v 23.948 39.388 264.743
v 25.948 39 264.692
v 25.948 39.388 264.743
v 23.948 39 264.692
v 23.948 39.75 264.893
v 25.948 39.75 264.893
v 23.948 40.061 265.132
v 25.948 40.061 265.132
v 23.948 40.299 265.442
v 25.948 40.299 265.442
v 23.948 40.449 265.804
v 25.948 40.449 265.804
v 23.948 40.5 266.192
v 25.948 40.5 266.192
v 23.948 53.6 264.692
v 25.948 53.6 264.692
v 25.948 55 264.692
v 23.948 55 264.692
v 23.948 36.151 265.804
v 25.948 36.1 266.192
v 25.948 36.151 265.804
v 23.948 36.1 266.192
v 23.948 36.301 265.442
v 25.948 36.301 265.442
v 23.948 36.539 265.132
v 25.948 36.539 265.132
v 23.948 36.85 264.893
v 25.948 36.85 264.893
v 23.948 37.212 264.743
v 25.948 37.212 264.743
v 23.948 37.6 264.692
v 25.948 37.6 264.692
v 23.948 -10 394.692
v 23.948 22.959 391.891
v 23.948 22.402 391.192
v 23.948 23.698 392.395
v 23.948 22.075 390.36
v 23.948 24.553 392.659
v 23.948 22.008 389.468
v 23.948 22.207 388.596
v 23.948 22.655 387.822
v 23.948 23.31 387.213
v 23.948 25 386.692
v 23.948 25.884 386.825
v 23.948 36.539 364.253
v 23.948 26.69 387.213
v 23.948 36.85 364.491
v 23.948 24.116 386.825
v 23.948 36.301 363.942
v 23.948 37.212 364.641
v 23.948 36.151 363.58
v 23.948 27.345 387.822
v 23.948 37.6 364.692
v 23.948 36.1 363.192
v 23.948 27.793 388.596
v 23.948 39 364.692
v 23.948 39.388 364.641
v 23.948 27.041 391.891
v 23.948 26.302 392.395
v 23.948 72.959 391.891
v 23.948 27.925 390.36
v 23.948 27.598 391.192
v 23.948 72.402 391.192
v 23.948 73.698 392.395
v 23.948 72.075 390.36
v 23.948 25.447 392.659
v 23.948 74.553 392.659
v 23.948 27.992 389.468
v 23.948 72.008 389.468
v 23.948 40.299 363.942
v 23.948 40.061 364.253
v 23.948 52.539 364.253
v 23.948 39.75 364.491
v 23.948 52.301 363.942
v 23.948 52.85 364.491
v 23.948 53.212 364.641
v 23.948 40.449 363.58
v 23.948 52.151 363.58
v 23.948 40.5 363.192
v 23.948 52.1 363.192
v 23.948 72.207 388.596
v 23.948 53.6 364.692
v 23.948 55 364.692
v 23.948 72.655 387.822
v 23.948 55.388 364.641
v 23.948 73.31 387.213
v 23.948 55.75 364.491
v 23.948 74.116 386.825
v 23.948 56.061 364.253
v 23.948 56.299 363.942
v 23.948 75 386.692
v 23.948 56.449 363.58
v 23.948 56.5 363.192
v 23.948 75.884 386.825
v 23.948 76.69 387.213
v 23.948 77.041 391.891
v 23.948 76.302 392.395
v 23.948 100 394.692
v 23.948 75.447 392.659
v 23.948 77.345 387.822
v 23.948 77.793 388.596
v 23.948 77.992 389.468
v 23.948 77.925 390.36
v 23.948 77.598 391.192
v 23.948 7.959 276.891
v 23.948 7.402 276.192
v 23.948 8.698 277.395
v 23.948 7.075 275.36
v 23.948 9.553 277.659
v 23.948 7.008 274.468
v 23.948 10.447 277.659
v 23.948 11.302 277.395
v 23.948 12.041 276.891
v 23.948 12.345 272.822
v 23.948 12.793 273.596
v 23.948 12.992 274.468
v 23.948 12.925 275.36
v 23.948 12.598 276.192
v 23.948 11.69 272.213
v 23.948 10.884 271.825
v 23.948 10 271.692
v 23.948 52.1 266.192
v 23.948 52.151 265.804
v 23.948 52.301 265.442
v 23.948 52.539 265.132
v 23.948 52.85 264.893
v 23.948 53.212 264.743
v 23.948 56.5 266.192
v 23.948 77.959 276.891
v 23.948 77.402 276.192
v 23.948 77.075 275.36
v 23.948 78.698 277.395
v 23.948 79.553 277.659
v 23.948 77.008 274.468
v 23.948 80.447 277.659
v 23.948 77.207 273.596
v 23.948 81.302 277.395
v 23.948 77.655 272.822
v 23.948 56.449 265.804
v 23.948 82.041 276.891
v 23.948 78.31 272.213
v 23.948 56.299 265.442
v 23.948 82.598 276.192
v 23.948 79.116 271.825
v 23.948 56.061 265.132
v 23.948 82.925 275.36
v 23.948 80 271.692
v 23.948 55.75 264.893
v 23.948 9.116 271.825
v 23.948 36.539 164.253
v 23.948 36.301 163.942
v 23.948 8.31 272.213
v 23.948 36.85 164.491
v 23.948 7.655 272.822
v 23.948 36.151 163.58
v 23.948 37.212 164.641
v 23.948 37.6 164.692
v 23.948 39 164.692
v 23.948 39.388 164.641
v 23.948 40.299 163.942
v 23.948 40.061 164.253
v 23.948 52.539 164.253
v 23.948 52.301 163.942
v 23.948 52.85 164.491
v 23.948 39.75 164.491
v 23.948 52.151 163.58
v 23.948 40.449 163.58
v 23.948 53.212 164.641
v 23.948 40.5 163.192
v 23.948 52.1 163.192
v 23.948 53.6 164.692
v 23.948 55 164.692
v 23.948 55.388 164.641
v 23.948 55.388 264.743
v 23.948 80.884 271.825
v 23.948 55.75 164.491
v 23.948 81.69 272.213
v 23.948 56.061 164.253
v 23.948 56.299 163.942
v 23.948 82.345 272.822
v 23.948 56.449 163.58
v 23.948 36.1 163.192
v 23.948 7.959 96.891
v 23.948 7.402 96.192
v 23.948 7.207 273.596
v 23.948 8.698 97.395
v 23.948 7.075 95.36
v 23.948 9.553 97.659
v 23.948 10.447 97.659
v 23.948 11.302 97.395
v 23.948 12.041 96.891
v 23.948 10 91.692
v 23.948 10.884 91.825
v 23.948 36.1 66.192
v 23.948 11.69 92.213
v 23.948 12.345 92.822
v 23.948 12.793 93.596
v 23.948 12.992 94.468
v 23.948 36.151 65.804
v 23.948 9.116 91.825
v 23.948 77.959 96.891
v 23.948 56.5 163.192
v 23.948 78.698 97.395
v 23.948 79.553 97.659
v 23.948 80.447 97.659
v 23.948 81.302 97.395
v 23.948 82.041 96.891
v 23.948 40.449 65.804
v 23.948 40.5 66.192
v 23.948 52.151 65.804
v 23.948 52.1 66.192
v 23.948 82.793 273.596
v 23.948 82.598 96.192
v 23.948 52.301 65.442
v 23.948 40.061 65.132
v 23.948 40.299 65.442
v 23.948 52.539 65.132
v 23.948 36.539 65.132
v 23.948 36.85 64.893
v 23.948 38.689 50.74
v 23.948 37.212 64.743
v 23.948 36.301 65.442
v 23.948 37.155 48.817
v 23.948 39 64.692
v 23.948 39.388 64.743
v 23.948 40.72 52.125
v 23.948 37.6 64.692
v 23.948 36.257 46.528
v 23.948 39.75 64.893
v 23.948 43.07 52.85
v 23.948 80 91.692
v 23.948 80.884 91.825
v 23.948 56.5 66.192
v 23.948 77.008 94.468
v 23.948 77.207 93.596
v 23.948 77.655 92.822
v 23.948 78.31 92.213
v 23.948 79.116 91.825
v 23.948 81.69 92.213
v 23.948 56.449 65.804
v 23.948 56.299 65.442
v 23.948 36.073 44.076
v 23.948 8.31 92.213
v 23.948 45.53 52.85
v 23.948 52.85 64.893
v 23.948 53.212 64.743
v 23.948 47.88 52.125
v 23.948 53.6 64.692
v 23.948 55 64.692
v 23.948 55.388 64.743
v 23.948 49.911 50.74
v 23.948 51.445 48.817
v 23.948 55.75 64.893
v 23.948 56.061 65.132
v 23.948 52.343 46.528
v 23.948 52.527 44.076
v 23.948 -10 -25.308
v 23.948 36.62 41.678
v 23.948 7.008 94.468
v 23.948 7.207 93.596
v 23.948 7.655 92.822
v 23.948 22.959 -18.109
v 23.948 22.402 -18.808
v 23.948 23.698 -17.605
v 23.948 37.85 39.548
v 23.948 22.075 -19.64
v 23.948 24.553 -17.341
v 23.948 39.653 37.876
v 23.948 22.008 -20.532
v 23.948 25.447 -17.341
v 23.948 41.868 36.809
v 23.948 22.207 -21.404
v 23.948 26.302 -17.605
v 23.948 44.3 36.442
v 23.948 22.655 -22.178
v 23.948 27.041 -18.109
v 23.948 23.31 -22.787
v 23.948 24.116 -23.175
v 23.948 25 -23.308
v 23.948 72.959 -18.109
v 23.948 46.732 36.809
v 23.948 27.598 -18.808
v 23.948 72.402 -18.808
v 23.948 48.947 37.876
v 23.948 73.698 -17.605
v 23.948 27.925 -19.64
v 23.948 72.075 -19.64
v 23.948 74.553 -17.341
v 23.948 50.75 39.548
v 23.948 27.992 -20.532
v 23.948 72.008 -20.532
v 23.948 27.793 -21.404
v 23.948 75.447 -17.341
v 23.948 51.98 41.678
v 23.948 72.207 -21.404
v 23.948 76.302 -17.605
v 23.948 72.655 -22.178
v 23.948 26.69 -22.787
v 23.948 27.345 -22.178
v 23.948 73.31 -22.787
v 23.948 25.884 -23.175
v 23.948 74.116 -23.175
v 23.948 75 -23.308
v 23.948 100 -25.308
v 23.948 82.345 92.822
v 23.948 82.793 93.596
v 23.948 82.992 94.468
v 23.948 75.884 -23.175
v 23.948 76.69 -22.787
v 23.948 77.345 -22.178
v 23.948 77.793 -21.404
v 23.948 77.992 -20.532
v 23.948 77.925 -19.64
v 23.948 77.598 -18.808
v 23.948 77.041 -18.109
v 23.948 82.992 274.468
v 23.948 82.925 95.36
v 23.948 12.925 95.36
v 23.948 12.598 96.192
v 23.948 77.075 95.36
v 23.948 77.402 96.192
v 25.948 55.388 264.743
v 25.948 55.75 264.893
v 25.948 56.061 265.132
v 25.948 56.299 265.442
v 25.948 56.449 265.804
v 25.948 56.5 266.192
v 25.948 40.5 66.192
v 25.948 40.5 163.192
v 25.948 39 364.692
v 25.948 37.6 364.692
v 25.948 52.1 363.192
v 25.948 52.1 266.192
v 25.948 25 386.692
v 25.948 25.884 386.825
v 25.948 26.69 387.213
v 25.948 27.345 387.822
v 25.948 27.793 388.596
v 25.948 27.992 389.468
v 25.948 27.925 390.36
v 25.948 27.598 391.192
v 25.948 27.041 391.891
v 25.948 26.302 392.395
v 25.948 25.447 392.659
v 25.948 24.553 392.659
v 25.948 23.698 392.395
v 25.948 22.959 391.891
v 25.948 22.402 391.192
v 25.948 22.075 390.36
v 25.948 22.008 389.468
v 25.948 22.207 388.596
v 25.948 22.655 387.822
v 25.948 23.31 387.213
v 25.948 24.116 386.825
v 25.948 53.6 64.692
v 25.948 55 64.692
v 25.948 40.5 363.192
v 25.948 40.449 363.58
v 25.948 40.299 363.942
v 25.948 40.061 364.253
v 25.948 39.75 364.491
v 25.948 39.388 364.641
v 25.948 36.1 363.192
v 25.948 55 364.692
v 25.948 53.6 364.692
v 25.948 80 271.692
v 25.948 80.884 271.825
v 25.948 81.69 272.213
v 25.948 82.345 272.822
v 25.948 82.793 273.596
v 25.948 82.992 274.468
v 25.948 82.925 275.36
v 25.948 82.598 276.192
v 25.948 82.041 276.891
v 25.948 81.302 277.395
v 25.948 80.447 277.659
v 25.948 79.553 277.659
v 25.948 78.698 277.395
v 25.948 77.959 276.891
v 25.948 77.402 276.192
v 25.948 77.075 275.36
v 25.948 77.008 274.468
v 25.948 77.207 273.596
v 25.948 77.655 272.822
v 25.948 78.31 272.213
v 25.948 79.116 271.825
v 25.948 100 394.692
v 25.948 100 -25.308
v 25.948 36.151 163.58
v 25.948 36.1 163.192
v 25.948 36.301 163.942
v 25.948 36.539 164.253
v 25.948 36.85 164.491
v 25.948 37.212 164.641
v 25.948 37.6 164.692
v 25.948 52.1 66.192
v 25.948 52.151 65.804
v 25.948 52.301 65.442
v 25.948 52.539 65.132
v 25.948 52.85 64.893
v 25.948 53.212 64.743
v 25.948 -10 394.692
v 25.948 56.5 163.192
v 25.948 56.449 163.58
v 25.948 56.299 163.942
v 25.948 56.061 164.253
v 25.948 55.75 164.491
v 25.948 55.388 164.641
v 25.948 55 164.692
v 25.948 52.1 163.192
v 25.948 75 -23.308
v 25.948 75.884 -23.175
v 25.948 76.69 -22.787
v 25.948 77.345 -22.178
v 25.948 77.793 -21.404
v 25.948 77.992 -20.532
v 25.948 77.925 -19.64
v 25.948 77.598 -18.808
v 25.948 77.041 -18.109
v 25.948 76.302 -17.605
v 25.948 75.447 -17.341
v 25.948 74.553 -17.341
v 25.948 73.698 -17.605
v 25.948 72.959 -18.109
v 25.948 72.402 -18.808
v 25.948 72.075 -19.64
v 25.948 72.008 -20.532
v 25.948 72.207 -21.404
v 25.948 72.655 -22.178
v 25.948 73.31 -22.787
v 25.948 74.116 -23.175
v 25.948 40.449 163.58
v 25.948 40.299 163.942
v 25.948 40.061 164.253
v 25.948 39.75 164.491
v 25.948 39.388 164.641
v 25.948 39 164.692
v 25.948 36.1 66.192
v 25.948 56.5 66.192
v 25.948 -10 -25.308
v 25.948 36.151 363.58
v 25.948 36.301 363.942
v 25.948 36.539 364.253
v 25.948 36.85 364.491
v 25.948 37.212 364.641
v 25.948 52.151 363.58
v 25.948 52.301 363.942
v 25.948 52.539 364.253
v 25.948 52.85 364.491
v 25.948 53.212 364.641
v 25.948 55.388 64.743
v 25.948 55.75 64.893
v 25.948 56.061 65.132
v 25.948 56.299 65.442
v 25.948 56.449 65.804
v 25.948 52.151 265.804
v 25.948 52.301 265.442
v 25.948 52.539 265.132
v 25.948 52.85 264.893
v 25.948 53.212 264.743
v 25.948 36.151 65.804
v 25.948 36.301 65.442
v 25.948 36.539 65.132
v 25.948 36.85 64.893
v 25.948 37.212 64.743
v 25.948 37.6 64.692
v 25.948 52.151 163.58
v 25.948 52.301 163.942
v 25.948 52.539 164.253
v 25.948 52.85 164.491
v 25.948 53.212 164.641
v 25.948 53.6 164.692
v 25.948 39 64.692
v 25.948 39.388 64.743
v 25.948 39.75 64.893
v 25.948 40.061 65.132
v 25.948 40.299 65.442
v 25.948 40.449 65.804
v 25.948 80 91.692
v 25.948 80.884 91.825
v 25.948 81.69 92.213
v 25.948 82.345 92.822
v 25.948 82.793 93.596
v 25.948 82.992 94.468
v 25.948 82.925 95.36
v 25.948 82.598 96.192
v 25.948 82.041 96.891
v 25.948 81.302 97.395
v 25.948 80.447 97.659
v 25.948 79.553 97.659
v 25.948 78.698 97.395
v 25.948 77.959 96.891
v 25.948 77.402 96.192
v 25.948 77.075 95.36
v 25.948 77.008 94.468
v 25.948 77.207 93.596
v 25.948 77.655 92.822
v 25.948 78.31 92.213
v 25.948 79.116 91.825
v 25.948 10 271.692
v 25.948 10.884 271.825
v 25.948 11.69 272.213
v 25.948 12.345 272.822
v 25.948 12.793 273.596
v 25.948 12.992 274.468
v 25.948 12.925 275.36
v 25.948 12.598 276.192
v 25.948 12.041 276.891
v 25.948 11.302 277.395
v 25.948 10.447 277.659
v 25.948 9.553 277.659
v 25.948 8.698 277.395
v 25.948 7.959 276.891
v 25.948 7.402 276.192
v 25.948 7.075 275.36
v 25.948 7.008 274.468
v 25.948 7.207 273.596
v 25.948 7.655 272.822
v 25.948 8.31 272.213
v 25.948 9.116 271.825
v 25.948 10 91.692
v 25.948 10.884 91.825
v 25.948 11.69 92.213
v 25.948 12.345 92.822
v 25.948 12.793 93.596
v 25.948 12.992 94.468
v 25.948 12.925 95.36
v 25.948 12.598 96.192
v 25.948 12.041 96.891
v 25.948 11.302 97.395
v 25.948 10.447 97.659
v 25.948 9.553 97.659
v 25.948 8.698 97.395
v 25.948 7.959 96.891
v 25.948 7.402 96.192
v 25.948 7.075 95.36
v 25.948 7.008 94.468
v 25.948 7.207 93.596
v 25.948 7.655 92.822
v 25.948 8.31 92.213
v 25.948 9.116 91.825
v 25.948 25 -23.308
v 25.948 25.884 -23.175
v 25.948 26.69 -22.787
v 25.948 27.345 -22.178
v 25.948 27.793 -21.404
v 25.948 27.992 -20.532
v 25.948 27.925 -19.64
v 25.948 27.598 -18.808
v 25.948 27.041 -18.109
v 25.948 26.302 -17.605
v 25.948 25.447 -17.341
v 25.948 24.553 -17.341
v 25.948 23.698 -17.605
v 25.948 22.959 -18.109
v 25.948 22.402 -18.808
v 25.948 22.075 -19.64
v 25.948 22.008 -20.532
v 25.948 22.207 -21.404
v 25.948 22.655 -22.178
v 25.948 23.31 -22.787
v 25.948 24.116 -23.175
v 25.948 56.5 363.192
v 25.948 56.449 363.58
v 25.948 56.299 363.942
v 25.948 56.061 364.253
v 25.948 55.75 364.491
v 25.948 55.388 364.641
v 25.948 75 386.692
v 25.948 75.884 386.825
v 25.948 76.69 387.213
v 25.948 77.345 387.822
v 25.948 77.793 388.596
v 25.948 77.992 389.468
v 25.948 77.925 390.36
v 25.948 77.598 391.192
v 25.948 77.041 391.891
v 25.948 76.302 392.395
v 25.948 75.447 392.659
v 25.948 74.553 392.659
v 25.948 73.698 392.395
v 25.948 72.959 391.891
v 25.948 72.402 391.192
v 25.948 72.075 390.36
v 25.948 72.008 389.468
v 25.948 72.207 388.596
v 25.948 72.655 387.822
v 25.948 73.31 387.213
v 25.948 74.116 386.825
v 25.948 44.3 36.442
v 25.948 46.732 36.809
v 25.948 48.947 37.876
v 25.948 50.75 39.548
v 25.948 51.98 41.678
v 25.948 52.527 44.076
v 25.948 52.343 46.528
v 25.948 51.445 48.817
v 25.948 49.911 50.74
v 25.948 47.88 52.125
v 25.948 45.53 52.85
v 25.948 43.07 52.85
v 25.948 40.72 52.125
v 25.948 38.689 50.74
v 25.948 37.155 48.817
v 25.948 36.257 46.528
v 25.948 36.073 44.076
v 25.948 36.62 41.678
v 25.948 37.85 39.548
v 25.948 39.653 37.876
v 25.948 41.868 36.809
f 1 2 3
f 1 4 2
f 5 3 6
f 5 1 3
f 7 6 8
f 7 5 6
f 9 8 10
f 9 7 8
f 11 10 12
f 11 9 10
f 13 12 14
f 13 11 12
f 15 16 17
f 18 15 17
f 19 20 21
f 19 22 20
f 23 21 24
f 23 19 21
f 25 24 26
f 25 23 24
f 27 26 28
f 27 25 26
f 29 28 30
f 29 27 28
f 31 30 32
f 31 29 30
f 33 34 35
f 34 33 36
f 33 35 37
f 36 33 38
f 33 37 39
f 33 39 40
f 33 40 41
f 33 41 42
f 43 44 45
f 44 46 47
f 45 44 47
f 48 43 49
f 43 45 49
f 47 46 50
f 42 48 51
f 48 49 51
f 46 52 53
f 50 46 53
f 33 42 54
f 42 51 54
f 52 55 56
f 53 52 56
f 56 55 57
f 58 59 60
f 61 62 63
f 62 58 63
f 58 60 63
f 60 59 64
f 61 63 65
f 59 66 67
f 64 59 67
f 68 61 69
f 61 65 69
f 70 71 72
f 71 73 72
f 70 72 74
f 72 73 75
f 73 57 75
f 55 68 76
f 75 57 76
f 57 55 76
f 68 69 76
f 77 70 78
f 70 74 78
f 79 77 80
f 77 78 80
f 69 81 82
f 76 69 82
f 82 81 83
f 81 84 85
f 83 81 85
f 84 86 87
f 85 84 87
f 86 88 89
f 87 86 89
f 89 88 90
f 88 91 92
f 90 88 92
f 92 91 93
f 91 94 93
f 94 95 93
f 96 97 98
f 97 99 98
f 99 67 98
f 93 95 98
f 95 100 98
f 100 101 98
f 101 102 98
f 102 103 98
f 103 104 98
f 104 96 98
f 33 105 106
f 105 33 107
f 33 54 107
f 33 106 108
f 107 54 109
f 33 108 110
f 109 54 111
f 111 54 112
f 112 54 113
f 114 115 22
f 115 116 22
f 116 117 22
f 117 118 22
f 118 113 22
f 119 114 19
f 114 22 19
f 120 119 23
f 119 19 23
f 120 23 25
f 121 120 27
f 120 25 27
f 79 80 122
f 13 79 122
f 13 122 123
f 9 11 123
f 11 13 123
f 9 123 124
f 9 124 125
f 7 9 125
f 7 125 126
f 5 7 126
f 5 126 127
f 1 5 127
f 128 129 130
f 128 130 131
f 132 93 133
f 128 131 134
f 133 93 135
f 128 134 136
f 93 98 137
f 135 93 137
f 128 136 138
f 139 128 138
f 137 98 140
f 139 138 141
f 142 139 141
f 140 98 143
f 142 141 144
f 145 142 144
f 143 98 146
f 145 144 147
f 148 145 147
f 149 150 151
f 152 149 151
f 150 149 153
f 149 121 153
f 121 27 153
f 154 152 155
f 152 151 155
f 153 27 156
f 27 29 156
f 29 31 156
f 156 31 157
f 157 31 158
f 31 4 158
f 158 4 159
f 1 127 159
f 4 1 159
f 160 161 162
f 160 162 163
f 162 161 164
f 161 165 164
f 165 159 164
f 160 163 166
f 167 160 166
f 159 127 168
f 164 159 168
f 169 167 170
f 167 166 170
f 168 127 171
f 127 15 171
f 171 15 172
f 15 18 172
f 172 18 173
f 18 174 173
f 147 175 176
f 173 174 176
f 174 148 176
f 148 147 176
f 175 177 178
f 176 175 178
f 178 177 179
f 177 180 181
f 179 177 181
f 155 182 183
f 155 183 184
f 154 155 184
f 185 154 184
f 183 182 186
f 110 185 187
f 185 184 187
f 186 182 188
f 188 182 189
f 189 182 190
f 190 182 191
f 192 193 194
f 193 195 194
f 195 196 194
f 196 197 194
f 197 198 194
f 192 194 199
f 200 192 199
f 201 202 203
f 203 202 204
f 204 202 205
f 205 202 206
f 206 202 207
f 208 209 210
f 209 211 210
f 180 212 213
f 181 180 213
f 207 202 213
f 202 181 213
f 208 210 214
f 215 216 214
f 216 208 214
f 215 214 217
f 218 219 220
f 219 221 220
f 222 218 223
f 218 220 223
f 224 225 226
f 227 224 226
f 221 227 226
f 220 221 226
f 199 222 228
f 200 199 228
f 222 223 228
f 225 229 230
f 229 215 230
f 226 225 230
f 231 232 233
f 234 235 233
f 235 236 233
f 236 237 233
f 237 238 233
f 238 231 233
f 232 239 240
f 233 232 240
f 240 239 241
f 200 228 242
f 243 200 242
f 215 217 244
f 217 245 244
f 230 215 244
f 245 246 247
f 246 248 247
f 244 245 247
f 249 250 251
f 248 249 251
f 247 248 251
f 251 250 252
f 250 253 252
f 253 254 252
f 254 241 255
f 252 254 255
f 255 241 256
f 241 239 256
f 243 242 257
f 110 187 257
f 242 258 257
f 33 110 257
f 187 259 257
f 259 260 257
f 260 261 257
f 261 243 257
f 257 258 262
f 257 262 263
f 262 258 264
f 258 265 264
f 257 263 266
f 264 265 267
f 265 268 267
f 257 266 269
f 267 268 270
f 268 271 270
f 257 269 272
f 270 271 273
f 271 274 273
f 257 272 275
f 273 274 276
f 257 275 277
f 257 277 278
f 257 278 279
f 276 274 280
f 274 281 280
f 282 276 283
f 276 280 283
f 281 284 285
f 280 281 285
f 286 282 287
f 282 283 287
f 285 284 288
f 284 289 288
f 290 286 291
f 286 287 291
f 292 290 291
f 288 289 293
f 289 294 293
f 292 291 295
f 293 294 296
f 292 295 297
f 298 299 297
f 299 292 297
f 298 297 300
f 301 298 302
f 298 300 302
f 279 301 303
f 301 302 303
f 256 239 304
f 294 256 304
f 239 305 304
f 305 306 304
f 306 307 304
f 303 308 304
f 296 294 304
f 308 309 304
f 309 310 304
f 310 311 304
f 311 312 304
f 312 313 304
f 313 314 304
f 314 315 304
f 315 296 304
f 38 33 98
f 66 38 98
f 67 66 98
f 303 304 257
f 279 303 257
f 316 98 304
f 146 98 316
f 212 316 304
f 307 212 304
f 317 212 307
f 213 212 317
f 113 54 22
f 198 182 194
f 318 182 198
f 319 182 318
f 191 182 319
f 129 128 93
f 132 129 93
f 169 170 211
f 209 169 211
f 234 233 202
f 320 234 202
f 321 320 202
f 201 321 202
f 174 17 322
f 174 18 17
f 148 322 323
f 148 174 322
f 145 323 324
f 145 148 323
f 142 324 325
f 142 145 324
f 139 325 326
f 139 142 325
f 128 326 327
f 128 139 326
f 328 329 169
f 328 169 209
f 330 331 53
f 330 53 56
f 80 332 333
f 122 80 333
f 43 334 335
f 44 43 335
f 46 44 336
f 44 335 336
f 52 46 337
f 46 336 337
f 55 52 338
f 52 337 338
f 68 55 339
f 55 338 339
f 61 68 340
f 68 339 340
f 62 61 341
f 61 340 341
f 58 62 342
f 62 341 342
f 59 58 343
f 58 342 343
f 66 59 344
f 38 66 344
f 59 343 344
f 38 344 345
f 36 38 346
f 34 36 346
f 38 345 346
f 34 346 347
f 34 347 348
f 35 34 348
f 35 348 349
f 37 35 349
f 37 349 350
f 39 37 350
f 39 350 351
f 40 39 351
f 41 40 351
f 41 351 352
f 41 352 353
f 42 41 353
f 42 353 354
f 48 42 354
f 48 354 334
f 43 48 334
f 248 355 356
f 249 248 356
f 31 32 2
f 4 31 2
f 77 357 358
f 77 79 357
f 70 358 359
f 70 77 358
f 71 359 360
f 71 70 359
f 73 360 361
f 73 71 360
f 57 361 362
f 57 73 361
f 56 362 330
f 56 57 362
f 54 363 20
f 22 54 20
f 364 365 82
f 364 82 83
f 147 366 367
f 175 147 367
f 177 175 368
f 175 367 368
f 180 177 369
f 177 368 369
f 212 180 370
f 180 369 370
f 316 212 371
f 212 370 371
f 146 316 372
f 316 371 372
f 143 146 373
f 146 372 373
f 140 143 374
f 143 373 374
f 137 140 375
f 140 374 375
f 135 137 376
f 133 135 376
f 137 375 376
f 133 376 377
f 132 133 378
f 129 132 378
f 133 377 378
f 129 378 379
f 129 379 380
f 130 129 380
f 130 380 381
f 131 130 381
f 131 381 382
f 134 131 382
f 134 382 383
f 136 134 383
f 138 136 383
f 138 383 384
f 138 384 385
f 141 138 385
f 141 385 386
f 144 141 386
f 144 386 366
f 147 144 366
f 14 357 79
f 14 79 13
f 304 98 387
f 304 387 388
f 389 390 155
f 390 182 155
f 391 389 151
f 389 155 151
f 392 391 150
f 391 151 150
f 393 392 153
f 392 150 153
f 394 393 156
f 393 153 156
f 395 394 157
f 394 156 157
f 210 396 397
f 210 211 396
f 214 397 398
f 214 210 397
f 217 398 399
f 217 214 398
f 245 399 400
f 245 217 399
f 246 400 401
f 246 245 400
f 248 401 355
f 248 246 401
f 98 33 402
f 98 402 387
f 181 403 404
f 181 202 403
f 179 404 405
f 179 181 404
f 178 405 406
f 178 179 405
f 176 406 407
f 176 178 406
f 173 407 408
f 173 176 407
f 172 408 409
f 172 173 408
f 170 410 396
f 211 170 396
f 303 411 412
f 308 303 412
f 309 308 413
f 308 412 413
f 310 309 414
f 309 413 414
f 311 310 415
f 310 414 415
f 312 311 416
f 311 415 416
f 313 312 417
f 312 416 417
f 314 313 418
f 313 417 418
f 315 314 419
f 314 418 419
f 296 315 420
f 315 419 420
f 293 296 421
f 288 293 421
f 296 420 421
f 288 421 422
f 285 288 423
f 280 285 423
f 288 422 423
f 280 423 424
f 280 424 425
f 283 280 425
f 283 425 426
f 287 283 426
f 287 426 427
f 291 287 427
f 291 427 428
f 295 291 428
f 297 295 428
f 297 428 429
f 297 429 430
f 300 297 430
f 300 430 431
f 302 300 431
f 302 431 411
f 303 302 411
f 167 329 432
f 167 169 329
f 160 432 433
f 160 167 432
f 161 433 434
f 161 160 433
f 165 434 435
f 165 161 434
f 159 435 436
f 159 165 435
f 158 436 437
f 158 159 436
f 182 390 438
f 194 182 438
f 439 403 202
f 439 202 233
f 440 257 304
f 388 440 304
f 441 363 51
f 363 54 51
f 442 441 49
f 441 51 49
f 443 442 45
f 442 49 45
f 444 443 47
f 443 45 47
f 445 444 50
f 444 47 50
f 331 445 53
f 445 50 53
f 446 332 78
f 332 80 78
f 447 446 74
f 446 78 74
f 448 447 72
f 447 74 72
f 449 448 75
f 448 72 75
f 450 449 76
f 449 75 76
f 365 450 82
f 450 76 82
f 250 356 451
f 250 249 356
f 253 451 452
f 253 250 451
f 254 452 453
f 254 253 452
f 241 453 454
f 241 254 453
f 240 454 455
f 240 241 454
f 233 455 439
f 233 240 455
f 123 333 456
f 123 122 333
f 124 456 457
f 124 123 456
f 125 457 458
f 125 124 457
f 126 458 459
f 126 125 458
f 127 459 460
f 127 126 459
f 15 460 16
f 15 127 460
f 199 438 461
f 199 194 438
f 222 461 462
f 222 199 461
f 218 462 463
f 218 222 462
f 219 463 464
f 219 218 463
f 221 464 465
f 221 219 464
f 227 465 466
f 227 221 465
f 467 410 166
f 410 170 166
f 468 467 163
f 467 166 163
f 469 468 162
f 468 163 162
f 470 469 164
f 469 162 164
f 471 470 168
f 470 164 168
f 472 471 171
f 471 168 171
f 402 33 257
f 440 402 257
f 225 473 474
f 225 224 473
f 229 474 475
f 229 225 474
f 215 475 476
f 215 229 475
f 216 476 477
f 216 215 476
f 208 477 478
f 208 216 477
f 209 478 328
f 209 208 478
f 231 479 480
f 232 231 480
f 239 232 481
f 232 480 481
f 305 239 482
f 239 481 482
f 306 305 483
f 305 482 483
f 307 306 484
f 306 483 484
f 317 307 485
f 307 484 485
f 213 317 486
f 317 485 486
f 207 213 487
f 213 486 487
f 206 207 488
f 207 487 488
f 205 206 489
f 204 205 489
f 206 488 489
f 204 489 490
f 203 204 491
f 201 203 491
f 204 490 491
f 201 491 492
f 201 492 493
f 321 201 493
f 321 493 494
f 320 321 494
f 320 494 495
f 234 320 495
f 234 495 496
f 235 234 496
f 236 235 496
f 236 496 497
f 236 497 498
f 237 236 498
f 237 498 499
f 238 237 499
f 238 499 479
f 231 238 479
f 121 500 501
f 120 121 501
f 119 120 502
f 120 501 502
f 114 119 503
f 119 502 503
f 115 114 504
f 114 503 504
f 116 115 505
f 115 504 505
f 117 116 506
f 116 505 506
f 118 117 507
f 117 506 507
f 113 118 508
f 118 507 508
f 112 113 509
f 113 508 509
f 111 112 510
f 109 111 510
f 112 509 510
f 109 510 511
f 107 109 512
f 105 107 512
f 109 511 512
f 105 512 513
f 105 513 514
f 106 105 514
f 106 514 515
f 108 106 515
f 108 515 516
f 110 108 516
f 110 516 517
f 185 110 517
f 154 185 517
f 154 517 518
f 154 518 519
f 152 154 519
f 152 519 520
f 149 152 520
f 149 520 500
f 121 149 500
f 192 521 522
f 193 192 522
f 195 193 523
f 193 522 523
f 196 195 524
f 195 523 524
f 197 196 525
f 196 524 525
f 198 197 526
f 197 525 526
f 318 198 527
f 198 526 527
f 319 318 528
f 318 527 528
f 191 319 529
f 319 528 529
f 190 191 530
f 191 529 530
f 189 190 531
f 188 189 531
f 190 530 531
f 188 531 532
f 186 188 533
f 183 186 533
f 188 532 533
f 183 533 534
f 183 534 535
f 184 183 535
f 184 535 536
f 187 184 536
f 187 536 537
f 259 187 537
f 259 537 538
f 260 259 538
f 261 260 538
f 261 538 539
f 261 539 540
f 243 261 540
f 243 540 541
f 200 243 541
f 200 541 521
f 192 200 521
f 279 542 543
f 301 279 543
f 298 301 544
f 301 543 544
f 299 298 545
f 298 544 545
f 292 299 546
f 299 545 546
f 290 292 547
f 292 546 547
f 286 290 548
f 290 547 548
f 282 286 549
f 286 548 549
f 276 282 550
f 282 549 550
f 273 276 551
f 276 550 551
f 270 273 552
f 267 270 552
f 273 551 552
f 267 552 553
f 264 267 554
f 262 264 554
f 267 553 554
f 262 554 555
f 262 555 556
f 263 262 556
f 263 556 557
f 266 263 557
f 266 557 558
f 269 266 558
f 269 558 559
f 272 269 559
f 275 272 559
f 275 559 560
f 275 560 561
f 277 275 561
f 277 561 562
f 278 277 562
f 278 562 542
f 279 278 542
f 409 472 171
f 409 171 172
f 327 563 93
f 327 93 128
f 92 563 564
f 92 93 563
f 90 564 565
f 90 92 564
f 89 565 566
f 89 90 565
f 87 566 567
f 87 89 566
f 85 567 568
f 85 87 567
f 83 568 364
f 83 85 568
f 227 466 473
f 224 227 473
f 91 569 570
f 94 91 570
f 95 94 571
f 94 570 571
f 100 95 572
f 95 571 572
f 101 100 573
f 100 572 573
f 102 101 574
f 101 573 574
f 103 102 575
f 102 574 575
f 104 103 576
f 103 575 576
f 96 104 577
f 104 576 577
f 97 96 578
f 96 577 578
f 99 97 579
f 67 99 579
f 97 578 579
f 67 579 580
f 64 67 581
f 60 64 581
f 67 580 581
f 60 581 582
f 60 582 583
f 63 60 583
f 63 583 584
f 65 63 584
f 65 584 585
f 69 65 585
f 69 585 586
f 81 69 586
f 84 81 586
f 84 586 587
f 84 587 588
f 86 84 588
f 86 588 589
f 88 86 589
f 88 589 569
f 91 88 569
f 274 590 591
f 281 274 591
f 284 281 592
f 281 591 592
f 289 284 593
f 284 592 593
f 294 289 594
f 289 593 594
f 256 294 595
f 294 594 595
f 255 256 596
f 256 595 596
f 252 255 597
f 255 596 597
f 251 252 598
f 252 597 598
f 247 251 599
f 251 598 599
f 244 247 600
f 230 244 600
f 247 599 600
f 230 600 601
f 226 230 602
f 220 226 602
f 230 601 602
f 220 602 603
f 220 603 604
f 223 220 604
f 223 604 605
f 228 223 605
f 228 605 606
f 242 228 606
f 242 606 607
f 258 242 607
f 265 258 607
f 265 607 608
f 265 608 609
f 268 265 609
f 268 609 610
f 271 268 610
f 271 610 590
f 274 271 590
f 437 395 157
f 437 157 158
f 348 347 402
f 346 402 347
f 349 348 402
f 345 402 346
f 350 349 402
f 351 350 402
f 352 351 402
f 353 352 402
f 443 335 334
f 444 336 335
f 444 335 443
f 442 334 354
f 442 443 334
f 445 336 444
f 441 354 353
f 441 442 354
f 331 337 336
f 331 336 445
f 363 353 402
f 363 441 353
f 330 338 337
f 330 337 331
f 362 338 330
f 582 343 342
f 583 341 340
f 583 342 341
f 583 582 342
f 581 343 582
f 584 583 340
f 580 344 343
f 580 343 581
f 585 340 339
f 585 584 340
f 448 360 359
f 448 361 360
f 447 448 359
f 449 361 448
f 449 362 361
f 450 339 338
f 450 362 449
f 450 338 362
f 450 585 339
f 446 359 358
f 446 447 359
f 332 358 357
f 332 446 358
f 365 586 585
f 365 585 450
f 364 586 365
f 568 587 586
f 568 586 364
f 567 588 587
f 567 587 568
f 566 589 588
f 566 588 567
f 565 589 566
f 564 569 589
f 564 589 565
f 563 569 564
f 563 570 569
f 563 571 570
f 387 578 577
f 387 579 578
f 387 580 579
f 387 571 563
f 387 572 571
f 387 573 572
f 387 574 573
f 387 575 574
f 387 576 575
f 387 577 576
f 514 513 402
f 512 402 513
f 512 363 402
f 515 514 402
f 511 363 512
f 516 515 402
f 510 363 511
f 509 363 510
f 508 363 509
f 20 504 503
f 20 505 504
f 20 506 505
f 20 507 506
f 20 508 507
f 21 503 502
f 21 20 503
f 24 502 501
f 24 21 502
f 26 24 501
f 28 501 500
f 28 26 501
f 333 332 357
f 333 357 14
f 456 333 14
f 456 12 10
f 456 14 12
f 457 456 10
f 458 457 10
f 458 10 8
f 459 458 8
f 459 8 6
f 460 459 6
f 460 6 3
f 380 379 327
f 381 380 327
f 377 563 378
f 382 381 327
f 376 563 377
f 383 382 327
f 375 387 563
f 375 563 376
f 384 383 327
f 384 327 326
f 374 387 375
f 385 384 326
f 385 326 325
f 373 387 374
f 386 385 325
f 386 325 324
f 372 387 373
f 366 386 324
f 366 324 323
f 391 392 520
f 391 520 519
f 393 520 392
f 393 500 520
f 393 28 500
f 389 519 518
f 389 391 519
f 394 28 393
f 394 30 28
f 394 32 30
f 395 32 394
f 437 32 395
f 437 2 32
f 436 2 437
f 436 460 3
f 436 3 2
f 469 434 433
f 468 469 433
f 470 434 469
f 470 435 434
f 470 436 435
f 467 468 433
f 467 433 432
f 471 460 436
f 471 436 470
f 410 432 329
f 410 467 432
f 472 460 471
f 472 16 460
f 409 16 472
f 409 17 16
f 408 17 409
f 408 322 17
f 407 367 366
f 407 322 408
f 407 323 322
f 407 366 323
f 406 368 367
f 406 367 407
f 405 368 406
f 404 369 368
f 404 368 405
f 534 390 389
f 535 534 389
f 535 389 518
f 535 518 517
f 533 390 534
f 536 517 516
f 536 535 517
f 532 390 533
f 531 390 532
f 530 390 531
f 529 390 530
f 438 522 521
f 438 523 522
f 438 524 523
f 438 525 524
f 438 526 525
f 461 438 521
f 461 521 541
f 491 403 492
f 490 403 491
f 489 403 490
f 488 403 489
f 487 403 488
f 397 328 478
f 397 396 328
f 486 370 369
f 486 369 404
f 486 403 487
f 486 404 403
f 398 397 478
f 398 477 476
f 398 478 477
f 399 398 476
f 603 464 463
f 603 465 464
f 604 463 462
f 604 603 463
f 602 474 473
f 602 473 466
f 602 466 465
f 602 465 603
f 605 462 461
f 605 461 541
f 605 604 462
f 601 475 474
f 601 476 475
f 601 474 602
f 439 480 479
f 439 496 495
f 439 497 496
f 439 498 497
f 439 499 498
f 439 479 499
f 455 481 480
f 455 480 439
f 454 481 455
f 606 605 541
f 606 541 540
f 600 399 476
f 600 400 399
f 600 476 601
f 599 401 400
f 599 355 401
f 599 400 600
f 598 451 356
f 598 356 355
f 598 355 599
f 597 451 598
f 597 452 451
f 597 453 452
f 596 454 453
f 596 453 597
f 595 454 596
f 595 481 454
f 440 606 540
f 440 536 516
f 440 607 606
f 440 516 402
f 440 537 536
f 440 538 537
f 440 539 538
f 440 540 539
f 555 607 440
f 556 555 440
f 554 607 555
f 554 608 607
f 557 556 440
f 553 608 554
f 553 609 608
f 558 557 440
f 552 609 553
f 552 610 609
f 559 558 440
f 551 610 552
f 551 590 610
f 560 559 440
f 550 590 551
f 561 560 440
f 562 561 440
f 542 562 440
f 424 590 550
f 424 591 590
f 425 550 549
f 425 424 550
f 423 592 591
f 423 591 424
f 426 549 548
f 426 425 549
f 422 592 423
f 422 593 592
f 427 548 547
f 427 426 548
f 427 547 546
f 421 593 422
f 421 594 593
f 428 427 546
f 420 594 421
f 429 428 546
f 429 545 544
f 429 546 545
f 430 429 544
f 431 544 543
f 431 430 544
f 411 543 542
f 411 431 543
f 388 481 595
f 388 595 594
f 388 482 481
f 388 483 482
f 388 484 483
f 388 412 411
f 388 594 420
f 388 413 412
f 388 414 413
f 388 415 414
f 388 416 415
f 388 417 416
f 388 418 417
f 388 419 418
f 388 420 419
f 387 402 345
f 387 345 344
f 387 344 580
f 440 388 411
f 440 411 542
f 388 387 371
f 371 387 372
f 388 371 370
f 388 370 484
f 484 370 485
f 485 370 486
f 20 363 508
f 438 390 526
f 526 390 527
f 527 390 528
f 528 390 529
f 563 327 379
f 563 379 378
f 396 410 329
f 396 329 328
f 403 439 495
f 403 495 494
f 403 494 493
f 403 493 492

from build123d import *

# Parameters (mm, degrees)
SKETCH1_W           = 420
SKETCH1_H           = 110
BOSS_EXTRUDE1_DEPTH = 2
SKETCH2_W           = 100
SKETCH2_H           = 4.4
CUT_EXTRUDE1_DEPTH  = 2
FILLET1_R           = 1.5
CUT_EXTRUDE2_REACH  = 4
SKETCH3_R           = 3
CUT_EXTRUDE3_REACH  = 4
SKETCH4_R           = 3
SKETCH4_R_2         = 8.25


with BuildPart() as part:
    # Sketch1 → Boss-Extrude1 (new body)
    with BuildSketch(Plane(origin=(23.948254466, 0, 0), x_dir=(0, 0, -1), z_dir=(1, 0, 0))):
        with Locations((-184.692172039, 45)):
            Rectangle(SKETCH1_W, SKETCH1_H)
    extrude(amount=BOSS_EXTRUDE1_DEPTH)

    # Sketch2 → Cut-Extrude1 (cut)
    with BuildSketch(Plane(origin=(25.948254466, 0, 0), x_dir=(0, 0, -1), z_dir=(1, 0, 0))):
        with Locations((-314.692172039, 54.3)):
            Rectangle(SKETCH2_W, SKETCH2_H)
        with Locations((-314.692172039, 38.3)):
            Rectangle(SKETCH2_W, SKETCH2_H)
        with Locations((-114.692172039, 54.3)):
            Rectangle(SKETCH2_W, SKETCH2_H)
        with Locations((-114.692172039, 38.3)):
            Rectangle(SKETCH2_W, SKETCH2_H)
    extrude(amount=-CUT_EXTRUDE1_DEPTH, mode=Mode.SUBTRACT)

    # Fillet1
    fillet1_edges = [part.edges().sort_by_distance(p)[0] for p in [
        (24.948254466, 52.1, 364.692172039),
        (24.948254466, 56.5, 364.692172039),
        (24.948254466, 56.5, 264.692172039),
        (24.948254466, 52.1, 264.692172039),
        (24.948254466, 36.1, 364.692172039),
        (24.948254466, 40.5, 364.692172039),
        (24.948254466, 40.5, 264.692172039),
        (24.948254466, 36.1, 264.692172039),
        (24.948254466, 56.5, 64.692172039),
        (24.948254466, 52.1, 64.692172039),
        (24.948254466, 52.1, 164.692172039),
        (24.948254466, 56.5, 164.692172039),
        (24.948254466, 36.1, 164.692172039),
        (24.948254466, 40.5, 164.692172039),
        (24.948254466, 40.5, 64.692172039),
        (24.948254466, 36.1, 64.692172039),
    ]]
    fillet(fillet1_edges, radius=FILLET1_R)

    # Sketch3 → Cut-Extrude2 (cut, up to next)
    with BuildSketch(Plane(origin=(25.948254466, 0, 0), x_dir=(0, 0, -1), z_dir=(1, 0, 0)), mode=Mode.PRIVATE) as cut_extrude2_sk1:
        with Locations((-389.692172039, 75)):
            Circle(SKETCH3_R)
    cut_extrude2_tool1 = extrude(cut_extrude2_sk1.sketch, amount=-CUT_EXTRUDE2_REACH, mode=Mode.PRIVATE) & part.part
    add(cut_extrude2_tool1.solids().sort_by_distance((25.948254, 75, 389.692172))[0], mode=Mode.SUBTRACT)
    # Sketch3 → Cut-Extrude2 (cut, up to next)
    with BuildSketch(Plane(origin=(25.948254466, 0, 0), x_dir=(0, 0, -1), z_dir=(1, 0, 0)), mode=Mode.PRIVATE) as cut_extrude2_sk2:
        with Locations((-389.692172039, 25)):
            Circle(SKETCH3_R)
    cut_extrude2_tool2 = extrude(cut_extrude2_sk2.sketch, amount=-CUT_EXTRUDE2_REACH, mode=Mode.PRIVATE) & part.part
    add(cut_extrude2_tool2.solids().sort_by_distance((25.948254, 25, 389.692172))[0], mode=Mode.SUBTRACT)
    # Sketch3 → Cut-Extrude2 (cut, up to next)
    with BuildSketch(Plane(origin=(25.948254466, 0, 0), x_dir=(0, 0, -1), z_dir=(1, 0, 0)), mode=Mode.PRIVATE) as cut_extrude2_sk3:
        with Locations((20.307827961, 75)):
            Circle(SKETCH3_R)
    cut_extrude2_tool3 = extrude(cut_extrude2_sk3.sketch, amount=-CUT_EXTRUDE2_REACH, mode=Mode.PRIVATE) & part.part
    add(cut_extrude2_tool3.solids().sort_by_distance((25.948254, 75, -20.307828))[0], mode=Mode.SUBTRACT)
    # Sketch3 → Cut-Extrude2 (cut, up to next)
    with BuildSketch(Plane(origin=(25.948254466, 0, 0), x_dir=(0, 0, -1), z_dir=(1, 0, 0)), mode=Mode.PRIVATE) as cut_extrude2_sk4:
        with Locations((20.307827961, 25)):
            Circle(SKETCH3_R)
    cut_extrude2_tool4 = extrude(cut_extrude2_sk4.sketch, amount=-CUT_EXTRUDE2_REACH, mode=Mode.PRIVATE) & part.part
    add(cut_extrude2_tool4.solids().sort_by_distance((25.948254, 25, -20.307828))[0], mode=Mode.SUBTRACT)

    # Sketch4 → Cut-Extrude3 (cut, up to next)
    with BuildSketch(Plane(origin=(25.948254466, 0, 0), x_dir=(0, 0, -1), z_dir=(1, 0, 0)), mode=Mode.PRIVATE) as cut_extrude3_sk1:
        with Locations((-274.692172039, 10)):
            Circle(SKETCH4_R)
    cut_extrude3_tool1 = extrude(cut_extrude3_sk1.sketch, amount=-CUT_EXTRUDE3_REACH, mode=Mode.PRIVATE) & part.part
    add(cut_extrude3_tool1.solids().sort_by_distance((25.948254, 10, 274.692172))[0], mode=Mode.SUBTRACT)
    # Sketch4 → Cut-Extrude3 (cut, up to next)
    with BuildSketch(Plane(origin=(25.948254466, 0, 0), x_dir=(0, 0, -1), z_dir=(1, 0, 0)), mode=Mode.PRIVATE) as cut_extrude3_sk2:
        with Locations((-94.692172039, 10)):
            Circle(SKETCH4_R)
    cut_extrude3_tool2 = extrude(cut_extrude3_sk2.sketch, amount=-CUT_EXTRUDE3_REACH, mode=Mode.PRIVATE) & part.part
    add(cut_extrude3_tool2.solids().sort_by_distance((25.948254, 10, 94.692172))[0], mode=Mode.SUBTRACT)
    # Sketch4 → Cut-Extrude3 (cut, up to next)
    with BuildSketch(Plane(origin=(25.948254466, 0, 0), x_dir=(0, 0, -1), z_dir=(1, 0, 0)), mode=Mode.PRIVATE) as cut_extrude3_sk3:
        with Locations((-44.692172039, 44.3)):
            Circle(SKETCH4_R_2)
    cut_extrude3_tool3 = extrude(cut_extrude3_sk3.sketch, amount=-CUT_EXTRUDE3_REACH, mode=Mode.PRIVATE) & part.part
    add(cut_extrude3_tool3.solids().sort_by_distance((25.948254, 44.3, 44.692172))[0], mode=Mode.SUBTRACT)
    # Sketch4 → Cut-Extrude3 (cut, up to next)
    with BuildSketch(Plane(origin=(25.948254466, 0, 0), x_dir=(0, 0, -1), z_dir=(1, 0, 0)), mode=Mode.PRIVATE) as cut_extrude3_sk4:
        with Locations((-274.692172039, 80)):
            Circle(SKETCH4_R)
    cut_extrude3_tool4 = extrude(cut_extrude3_sk4.sketch, amount=-CUT_EXTRUDE3_REACH, mode=Mode.PRIVATE) & part.part
    add(cut_extrude3_tool4.solids().sort_by_distance((25.948254, 80, 274.692172))[0], mode=Mode.SUBTRACT)
    # Sketch4 → Cut-Extrude3 (cut, up to next)
    with BuildSketch(Plane(origin=(25.948254466, 0, 0), x_dir=(0, 0, -1), z_dir=(1, 0, 0)), mode=Mode.PRIVATE) as cut_extrude3_sk5:
        with Locations((-94.692172039, 80)):
            Circle(SKETCH4_R)
    cut_extrude3_tool5 = extrude(cut_extrude3_sk5.sketch, amount=-CUT_EXTRUDE3_REACH, mode=Mode.PRIVATE) & part.part
    add(cut_extrude3_tool5.solids().sort_by_distance((25.948254, 80, 94.692172))[0], mode=Mode.SUBTRACT)


solid = part.part
